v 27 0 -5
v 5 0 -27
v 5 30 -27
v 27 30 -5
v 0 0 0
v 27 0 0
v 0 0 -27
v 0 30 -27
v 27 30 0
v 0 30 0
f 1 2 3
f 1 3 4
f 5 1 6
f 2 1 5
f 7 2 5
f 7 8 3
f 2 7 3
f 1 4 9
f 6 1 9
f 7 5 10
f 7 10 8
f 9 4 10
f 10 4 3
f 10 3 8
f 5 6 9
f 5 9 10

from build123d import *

# Parameters (mm, degrees)
BOSS_EXTRUDE1_DEPTH = 30
CUT_EXTRUDE1_DEPTH  = 31


with BuildPart() as part:
    # Sketch1 → Boss-Extrude1 (new body)
    with BuildSketch(Plane(origin=(0, 0, 0), x_dir=(1, 0, 0), z_dir=(0, 1, 0))):
        Polygon((0, 0), (0, 32), (32, 0), align=None)
    extrude(amount=BOSS_EXTRUDE1_DEPTH)

    # Sketch2 → Cut-Extrude1 (cut, through all)
    with BuildSketch(Plane(origin=(0, 30, 0), x_dir=(1, 0, 0), z_dir=(0, 1, 0))):
        Polygon((0, 27), (5, 27), (0, 32), align=None)
        Polygon((27, 0), (32, 0), (27, 5), align=None)
    extrude(amount=-CUT_EXTRUDE1_DEPTH, mode=Mode.SUBTRACT)


solid = part.part
